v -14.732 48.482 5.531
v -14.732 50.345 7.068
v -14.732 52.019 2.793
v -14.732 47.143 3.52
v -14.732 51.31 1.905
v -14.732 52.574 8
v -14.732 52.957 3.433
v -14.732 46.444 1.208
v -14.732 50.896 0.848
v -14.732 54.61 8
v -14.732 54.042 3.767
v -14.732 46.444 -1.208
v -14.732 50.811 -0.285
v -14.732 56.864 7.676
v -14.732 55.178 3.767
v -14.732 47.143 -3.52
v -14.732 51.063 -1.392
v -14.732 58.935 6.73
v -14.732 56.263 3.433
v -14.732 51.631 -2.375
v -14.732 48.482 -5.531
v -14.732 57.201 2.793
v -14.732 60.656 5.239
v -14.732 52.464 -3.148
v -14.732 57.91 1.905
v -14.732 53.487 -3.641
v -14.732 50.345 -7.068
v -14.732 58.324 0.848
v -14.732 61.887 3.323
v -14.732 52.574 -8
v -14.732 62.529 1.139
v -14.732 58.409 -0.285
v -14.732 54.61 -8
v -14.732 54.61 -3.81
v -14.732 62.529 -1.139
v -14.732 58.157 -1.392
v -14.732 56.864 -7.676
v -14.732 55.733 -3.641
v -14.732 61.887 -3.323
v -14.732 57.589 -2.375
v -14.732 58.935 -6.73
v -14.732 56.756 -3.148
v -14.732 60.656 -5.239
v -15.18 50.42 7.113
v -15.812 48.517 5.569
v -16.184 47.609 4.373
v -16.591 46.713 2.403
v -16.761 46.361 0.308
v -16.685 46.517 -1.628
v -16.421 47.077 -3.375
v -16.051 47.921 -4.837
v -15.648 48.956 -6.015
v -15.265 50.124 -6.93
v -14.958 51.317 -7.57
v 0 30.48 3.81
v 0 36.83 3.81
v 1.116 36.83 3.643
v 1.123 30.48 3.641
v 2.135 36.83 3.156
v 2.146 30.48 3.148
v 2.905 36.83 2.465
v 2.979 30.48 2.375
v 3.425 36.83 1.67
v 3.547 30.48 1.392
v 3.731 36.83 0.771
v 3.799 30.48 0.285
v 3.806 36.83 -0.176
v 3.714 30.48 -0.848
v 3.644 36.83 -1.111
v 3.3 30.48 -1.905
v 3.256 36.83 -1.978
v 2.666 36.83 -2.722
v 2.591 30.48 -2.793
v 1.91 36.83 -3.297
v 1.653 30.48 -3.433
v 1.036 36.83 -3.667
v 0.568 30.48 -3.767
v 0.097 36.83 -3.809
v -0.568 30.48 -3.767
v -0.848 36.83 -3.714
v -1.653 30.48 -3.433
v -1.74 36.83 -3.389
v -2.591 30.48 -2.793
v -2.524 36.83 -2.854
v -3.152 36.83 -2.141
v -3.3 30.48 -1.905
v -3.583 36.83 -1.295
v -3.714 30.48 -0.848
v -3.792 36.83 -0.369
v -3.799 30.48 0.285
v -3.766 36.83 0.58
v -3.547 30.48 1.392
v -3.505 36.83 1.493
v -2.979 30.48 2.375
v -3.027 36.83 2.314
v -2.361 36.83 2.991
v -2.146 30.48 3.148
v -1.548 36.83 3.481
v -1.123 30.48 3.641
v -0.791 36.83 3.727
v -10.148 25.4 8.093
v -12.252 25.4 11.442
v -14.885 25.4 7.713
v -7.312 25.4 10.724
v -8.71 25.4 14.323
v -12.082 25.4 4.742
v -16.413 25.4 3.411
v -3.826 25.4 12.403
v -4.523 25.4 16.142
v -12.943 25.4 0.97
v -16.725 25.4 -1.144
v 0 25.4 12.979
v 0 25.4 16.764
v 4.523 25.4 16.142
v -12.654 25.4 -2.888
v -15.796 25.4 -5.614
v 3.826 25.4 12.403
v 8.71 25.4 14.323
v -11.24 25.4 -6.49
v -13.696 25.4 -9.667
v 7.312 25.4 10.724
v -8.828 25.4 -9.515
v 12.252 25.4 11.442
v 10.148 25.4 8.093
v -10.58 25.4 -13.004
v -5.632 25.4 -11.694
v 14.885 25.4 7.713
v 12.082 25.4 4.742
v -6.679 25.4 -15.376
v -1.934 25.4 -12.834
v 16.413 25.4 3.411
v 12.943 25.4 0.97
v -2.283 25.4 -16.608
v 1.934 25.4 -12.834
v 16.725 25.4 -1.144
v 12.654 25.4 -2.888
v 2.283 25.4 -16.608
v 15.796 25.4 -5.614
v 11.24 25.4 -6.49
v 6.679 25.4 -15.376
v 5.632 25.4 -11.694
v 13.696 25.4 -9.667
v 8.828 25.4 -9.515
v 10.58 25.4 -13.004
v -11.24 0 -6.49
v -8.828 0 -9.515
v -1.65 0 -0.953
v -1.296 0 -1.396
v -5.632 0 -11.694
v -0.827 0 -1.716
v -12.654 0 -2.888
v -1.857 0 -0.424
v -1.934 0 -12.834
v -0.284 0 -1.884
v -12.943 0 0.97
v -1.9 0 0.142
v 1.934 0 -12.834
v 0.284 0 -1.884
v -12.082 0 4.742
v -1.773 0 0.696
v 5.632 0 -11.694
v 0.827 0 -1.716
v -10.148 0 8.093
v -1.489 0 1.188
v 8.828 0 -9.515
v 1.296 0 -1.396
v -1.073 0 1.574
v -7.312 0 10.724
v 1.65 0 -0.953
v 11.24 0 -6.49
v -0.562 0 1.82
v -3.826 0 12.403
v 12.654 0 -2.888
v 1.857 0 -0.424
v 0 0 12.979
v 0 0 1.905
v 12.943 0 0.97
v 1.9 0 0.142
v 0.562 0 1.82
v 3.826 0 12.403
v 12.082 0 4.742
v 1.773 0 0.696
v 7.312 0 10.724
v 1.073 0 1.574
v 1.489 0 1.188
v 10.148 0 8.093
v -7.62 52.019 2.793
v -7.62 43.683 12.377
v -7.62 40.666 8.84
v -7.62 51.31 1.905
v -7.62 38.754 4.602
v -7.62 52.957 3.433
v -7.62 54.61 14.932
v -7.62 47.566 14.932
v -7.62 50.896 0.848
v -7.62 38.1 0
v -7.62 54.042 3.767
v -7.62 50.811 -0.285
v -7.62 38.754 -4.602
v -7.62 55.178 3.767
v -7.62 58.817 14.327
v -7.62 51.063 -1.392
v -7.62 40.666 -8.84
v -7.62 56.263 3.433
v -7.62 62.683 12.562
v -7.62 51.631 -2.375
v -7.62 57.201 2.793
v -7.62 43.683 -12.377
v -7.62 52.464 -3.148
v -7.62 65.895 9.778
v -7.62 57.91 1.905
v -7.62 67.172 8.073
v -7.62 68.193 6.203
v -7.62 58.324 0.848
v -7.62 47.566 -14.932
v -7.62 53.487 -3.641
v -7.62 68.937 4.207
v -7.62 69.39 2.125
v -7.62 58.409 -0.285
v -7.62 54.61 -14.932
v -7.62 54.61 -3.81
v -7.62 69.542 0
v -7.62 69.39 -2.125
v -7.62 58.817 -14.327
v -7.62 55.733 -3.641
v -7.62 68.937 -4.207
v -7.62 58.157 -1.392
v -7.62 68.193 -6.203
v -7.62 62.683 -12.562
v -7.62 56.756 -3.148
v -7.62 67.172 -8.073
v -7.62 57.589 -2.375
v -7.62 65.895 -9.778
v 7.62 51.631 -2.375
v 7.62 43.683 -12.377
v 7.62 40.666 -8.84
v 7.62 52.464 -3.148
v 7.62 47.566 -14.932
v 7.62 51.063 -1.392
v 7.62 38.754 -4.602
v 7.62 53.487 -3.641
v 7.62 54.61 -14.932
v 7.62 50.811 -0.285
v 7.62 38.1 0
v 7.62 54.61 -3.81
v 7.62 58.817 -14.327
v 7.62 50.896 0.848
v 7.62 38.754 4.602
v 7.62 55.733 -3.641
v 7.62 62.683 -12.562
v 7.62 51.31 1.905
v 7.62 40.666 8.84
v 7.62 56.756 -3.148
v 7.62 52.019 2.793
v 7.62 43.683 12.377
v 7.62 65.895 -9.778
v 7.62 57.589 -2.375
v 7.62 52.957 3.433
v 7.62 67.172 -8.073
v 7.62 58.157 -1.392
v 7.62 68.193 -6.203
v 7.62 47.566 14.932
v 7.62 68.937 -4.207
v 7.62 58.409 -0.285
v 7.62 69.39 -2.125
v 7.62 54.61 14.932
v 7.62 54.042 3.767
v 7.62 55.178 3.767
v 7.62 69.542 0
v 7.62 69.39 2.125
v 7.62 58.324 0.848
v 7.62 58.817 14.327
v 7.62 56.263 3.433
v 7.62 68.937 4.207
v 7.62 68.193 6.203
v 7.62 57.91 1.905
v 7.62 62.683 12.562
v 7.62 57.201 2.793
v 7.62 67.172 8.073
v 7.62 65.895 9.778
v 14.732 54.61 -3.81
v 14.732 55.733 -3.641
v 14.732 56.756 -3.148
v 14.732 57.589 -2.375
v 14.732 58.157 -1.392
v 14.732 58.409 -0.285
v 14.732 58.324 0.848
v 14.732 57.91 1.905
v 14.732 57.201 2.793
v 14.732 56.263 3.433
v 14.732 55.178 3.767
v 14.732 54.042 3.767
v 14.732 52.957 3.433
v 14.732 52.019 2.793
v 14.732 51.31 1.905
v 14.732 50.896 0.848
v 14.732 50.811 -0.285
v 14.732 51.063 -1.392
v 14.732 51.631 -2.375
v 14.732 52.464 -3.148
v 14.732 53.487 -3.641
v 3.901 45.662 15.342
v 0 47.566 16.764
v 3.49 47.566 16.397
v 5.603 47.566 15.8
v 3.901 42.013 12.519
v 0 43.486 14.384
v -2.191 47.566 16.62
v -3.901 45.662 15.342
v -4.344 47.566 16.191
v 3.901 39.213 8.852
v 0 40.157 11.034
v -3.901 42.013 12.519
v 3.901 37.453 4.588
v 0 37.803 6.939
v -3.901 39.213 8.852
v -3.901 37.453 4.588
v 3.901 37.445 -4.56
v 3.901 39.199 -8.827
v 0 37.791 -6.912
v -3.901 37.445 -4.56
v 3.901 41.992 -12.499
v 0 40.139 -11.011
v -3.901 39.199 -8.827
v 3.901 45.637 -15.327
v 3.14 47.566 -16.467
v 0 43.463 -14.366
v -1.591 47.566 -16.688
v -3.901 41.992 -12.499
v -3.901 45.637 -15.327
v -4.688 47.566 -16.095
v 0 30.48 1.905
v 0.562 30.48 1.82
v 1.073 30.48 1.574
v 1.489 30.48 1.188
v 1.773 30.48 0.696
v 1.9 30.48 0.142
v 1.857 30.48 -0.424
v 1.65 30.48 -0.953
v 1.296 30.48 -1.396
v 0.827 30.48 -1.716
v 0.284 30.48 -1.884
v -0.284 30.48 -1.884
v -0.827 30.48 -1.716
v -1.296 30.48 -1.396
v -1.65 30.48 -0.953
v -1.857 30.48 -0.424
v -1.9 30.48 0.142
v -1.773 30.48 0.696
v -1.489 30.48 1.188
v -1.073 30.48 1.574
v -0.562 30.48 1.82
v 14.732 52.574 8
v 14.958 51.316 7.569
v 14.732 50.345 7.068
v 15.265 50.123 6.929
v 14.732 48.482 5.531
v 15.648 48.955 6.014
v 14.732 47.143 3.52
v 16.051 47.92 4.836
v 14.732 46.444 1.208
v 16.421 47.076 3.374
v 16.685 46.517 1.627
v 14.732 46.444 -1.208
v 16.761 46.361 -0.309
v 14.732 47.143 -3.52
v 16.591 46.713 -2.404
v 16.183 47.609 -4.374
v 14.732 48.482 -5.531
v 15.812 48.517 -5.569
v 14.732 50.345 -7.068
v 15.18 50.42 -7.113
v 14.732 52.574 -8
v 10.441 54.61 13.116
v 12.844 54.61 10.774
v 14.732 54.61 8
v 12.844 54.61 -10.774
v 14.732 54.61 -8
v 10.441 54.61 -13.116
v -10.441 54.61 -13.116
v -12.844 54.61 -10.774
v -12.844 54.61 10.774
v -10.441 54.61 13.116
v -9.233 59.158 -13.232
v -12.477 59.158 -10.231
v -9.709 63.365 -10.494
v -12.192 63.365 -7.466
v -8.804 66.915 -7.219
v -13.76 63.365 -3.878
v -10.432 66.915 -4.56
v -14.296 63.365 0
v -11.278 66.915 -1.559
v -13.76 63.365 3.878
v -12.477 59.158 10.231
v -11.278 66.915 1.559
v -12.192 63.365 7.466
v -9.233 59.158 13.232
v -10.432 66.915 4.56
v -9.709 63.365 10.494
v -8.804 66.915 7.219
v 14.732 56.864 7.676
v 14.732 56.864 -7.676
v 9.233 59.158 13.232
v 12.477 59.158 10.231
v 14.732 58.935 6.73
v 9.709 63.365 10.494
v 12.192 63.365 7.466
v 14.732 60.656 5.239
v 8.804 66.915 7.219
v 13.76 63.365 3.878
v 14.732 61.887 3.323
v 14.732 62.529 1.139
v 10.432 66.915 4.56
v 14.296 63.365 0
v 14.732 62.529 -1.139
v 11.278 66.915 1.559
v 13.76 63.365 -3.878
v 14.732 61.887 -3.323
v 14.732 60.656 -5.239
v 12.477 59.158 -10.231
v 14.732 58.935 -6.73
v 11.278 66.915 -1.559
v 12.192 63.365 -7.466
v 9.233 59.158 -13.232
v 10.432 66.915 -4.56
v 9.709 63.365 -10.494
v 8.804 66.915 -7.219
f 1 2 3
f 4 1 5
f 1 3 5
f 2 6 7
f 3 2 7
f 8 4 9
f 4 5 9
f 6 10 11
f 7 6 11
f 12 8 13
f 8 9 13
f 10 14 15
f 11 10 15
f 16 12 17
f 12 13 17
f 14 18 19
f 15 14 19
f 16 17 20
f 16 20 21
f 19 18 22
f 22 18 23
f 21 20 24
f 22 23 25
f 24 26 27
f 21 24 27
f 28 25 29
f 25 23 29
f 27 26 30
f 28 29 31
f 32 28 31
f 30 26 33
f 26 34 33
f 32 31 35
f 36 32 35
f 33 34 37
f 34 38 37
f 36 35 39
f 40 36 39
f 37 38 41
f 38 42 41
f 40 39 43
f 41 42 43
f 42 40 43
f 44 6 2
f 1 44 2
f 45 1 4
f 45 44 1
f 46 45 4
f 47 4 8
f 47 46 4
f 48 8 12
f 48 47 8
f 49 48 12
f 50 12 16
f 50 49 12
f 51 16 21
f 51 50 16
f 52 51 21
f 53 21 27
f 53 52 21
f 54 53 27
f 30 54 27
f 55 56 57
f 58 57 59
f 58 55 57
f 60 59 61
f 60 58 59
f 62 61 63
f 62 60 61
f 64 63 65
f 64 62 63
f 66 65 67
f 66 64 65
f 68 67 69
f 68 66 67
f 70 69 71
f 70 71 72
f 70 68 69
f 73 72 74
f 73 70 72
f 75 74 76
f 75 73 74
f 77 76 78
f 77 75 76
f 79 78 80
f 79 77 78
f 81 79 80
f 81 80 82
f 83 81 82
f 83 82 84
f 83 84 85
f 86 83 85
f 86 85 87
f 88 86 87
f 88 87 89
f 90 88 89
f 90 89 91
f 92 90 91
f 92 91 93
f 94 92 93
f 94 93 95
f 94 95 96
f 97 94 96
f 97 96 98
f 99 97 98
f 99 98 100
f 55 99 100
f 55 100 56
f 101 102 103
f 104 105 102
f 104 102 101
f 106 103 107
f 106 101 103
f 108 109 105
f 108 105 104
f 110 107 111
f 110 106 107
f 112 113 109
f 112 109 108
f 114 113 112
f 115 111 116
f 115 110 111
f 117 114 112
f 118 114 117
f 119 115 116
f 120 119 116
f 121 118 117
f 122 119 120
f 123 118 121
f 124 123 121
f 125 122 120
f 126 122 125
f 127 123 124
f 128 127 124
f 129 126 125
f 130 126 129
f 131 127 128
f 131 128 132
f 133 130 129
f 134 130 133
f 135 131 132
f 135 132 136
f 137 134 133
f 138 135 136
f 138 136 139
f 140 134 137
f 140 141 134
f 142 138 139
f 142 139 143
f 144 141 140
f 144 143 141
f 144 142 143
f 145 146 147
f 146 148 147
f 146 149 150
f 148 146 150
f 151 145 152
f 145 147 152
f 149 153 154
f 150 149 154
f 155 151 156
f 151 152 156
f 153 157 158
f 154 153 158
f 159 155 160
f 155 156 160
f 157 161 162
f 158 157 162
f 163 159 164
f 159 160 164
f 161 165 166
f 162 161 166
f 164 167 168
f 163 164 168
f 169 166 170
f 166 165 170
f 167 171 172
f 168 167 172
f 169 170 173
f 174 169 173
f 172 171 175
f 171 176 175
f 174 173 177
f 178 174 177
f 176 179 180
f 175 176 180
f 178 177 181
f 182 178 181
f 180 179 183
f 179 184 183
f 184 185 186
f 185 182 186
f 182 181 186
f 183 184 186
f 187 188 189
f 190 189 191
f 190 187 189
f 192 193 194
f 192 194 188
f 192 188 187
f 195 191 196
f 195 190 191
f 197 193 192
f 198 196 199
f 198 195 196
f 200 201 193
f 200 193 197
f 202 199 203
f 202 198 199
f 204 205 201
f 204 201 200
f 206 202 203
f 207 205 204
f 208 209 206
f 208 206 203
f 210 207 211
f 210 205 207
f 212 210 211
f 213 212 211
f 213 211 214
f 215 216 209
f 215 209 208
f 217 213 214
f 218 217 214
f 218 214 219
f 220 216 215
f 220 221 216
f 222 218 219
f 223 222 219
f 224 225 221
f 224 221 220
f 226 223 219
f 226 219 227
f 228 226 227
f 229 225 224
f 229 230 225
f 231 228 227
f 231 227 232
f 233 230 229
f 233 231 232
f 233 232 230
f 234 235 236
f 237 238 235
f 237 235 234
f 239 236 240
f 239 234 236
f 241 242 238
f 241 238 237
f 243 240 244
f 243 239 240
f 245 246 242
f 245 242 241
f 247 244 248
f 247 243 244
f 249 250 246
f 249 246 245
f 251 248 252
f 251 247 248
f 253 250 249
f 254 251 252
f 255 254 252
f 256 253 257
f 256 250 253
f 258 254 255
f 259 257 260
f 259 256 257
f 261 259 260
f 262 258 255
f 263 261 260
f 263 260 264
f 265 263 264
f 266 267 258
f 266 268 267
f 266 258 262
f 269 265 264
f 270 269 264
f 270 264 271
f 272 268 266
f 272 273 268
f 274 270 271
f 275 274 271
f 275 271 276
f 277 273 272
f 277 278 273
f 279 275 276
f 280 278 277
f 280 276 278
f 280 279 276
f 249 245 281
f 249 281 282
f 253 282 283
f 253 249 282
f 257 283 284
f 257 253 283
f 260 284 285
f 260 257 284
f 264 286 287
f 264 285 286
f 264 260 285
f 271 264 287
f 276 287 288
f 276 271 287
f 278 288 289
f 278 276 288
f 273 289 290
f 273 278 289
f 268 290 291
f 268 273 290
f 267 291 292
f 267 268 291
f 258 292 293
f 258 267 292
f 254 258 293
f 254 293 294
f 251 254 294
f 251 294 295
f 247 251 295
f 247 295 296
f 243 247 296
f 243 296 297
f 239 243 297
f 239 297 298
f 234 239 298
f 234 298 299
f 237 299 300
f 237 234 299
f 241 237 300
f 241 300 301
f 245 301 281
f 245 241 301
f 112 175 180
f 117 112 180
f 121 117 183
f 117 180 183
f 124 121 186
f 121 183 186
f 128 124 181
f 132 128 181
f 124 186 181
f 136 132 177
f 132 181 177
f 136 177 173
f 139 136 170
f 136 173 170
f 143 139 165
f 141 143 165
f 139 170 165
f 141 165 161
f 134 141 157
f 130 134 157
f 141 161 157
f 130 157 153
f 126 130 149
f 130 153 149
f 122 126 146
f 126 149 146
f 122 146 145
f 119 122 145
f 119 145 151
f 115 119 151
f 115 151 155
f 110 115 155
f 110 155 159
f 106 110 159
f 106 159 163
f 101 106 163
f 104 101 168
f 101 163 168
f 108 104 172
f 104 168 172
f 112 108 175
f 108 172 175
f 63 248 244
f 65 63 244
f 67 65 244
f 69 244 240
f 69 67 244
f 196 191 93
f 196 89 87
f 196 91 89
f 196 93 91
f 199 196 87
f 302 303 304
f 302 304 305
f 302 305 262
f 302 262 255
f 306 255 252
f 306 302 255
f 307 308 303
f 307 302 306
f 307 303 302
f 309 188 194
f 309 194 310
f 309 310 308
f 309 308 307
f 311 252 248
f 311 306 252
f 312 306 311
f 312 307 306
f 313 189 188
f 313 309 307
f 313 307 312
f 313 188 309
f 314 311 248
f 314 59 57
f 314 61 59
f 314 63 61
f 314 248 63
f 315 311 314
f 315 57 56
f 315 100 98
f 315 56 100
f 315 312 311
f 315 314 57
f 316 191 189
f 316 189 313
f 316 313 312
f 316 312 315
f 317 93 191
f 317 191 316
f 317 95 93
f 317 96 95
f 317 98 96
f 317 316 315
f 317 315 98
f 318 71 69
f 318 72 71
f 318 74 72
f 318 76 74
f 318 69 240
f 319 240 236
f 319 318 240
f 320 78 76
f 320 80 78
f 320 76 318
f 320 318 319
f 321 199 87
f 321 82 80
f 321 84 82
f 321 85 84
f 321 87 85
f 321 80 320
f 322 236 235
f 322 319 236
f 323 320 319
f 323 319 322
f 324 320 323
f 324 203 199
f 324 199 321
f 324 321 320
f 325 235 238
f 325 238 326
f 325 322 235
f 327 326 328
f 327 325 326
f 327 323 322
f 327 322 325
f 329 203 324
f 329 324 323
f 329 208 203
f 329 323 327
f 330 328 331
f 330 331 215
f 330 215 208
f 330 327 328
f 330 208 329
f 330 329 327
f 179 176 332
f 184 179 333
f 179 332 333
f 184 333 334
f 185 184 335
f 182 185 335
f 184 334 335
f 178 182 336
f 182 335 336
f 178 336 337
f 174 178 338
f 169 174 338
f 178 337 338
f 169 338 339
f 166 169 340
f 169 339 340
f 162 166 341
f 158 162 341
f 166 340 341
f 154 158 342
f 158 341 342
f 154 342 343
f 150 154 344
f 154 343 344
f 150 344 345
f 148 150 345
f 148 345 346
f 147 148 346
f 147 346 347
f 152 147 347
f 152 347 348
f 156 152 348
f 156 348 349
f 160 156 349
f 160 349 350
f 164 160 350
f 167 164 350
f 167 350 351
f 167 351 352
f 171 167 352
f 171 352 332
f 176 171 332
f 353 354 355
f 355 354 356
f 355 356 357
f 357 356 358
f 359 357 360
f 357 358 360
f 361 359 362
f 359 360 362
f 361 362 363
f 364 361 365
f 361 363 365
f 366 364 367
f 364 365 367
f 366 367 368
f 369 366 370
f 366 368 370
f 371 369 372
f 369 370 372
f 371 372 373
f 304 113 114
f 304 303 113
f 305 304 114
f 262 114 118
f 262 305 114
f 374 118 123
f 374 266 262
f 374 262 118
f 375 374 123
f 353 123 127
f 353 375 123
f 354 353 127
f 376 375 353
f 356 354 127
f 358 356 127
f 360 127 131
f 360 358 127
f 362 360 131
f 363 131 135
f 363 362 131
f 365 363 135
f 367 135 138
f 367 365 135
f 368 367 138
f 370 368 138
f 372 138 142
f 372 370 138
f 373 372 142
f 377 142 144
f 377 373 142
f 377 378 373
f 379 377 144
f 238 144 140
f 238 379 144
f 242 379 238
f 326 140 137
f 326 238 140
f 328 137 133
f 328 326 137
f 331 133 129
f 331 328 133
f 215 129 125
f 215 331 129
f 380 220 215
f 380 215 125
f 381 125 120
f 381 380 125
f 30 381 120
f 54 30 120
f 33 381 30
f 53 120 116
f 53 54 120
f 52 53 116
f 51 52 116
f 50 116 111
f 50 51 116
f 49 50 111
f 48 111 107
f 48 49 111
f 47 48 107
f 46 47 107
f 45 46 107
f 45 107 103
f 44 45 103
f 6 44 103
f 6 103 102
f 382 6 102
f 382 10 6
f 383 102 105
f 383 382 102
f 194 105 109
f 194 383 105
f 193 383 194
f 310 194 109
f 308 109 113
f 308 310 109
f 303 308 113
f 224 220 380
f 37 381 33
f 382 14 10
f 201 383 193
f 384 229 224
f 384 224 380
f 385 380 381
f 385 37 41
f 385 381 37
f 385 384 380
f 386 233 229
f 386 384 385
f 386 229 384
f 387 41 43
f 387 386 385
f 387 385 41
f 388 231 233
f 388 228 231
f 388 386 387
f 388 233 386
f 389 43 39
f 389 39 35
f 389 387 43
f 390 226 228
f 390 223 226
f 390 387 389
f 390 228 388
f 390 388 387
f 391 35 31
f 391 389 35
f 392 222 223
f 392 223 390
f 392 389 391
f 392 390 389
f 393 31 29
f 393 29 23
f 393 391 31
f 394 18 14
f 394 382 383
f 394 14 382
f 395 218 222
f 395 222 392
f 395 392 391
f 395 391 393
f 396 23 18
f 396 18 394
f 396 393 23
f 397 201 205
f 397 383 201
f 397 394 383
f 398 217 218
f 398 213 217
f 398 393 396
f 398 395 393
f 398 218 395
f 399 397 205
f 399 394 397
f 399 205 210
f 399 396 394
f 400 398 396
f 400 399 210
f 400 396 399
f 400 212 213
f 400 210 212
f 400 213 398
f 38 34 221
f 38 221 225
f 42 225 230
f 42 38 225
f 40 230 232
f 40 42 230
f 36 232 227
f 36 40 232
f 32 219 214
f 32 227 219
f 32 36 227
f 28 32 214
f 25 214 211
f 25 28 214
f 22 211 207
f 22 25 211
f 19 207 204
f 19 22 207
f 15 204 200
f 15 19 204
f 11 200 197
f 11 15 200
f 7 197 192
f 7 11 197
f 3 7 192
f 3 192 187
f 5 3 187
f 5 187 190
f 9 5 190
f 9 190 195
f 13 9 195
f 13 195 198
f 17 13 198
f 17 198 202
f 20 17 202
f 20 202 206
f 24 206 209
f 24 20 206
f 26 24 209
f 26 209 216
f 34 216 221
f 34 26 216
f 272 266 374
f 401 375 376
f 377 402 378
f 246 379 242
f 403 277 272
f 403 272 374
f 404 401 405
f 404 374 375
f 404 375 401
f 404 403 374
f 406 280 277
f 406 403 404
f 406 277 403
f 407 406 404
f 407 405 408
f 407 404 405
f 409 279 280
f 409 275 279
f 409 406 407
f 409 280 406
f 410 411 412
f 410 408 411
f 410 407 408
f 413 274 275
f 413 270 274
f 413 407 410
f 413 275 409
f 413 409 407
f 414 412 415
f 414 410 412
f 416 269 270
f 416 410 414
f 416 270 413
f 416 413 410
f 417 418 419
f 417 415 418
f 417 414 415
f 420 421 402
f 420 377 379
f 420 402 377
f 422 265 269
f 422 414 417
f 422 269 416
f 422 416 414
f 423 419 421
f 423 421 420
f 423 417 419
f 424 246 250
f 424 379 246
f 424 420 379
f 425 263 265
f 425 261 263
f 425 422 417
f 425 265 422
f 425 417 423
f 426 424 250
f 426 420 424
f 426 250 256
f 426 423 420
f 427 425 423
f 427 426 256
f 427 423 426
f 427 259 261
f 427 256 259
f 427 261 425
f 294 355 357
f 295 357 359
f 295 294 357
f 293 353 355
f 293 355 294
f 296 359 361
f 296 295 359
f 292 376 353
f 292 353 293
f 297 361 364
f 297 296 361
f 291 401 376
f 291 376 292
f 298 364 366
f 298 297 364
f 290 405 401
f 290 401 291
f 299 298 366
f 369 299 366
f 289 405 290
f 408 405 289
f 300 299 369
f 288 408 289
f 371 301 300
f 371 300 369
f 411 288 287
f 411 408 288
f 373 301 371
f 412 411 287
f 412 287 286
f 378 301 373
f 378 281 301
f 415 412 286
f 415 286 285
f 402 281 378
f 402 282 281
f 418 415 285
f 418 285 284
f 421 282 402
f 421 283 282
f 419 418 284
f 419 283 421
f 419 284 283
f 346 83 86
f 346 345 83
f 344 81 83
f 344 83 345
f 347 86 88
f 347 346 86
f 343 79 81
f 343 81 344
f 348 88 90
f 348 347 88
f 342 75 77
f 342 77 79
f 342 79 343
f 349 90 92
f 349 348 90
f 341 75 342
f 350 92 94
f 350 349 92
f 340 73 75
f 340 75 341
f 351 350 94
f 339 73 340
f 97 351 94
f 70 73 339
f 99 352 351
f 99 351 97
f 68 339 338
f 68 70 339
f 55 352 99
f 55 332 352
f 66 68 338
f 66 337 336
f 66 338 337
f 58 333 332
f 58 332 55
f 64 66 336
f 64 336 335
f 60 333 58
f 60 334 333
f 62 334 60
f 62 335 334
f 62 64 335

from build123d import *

# Parameters (mm, degrees)
SKETCH1_R               = 12.9794
BOSS_EXTRUDE1_DEPTH     = 25.4
CUT_EXTRUDE1_DEPTH      = 76.208452105
CUT_EXTRUDE1_DEPTH_BACK = 76.208452105
SKETCH3_R               = 3.81
SKETCH6_R               = 8.255
CUT_EXTRUDE2_DEPTH      = 2.032
SKETCH7_R               = 3.81
CUT_EXTRUDE3_DEPTH      = 26.67
SKETCH7_3_R             = 1.905
CUT_EXTRUDE4_DEPTH      = 46.693656372


with BuildPart() as part:
    # Sketch1 → Boss-Extrude1 (new body)
    with BuildSketch(Plane(origin=(0, 0, 0), x_dir=(1, 0, 0), z_dir=(0, 1, 0))):
        Circle(SKETCH1_R)
    extrude(amount=BOSS_EXTRUDE1_DEPTH)

    # Sketch2 → Revolve1 (revolve)
    with BuildSketch(Plane(origin=(0, 0, 0), x_dir=(0, 0, -1), z_dir=(1, 0, 0))):
        with BuildLine():
            Line((-16.764, 25.4), (-16.764, 54.61))
            ThreePointArc((-16.764, 54.61), (-11.85393808, 66.46393808), (0, 71.374))
            Line((0, 71.374), (0, 25.4))
            Line((0, 25.4), (-16.764, 25.4))
        make_face()
    revolve(axis=Axis((0, 25.4, 0), (0, 1, 0)))

    # Sketch3 → Cut-Extrude1 (cut, two sides: drawn at the far end of the back side and taken through both)
    with BuildSketch(Plane(origin=(0, 0, 0), x_dir=(0, 0, -1), z_dir=(1, 0, 0)).offset(-CUT_EXTRUDE1_DEPTH_BACK)):
        with Locations((0, 54.61)):
            Circle(SKETCH3_R)
    extrude(amount=CUT_EXTRUDE1_DEPTH + CUT_EXTRUDE1_DEPTH_BACK, mode=Mode.SUBTRACT)

    # Sketch4 → Cut-Revolve1 (revolve, cut)
    with BuildSketch(Plane.XY):
        with BuildLine():
            Line((-7.62, 38.1), (-7.62, 54.61))
            Line((-7.62, 54.61), (7.62, 54.61))
            Line((7.62, 54.61), (7.62, 38.1))
            ThreePointArc((7.62, 38.1), (0, 36.42636725), (-7.62, 38.1))
        make_face()
    revolve(axis=Axis((-7.62, 54.61, 0), (1, 0, 0)), mode=Mode.SUBTRACT)

    # Sketch6 → Cut-Extrude2 (cut)
    with BuildSketch(Plane(origin=(16.764, 0, 0), x_dir=(0, 0, -1), z_dir=(1, 0, 0))):
        with Locations((0, 54.61)):
            Circle(SKETCH6_R)
    cut_extrude2 = extrude(amount=-CUT_EXTRUDE2_DEPTH, mode=Mode.SUBTRACT)

    # Mirror1: Cut-Extrude2 across plane
    add(cut_extrude2.mirror(Plane(origin=(0, 0, 0), x_dir=(0, 0, 1), z_dir=(1, 0, 0))), mode=Mode.SUBTRACT)

    # Sketch7 → Cut-Extrude3 (cut)
    with BuildSketch(Plane(origin=(0, 30.48, 0), x_dir=(1, 0, 0), z_dir=(0, 1, 0))):
        Circle(SKETCH7_R)
    extrude(amount=CUT_EXTRUDE3_DEPTH, mode=Mode.SUBTRACT)

    # Sketch7<3> → Cut-Extrude4 (cut, through all)
    with BuildSketch(Plane(origin=(0, 30.48, 0), x_dir=(1, 0, 0), z_dir=(0, 1, 0))):
        Circle(SKETCH7_3_R)
    extrude(amount=-CUT_EXTRUDE4_DEPTH, mode=Mode.SUBTRACT)


solid = part.part
